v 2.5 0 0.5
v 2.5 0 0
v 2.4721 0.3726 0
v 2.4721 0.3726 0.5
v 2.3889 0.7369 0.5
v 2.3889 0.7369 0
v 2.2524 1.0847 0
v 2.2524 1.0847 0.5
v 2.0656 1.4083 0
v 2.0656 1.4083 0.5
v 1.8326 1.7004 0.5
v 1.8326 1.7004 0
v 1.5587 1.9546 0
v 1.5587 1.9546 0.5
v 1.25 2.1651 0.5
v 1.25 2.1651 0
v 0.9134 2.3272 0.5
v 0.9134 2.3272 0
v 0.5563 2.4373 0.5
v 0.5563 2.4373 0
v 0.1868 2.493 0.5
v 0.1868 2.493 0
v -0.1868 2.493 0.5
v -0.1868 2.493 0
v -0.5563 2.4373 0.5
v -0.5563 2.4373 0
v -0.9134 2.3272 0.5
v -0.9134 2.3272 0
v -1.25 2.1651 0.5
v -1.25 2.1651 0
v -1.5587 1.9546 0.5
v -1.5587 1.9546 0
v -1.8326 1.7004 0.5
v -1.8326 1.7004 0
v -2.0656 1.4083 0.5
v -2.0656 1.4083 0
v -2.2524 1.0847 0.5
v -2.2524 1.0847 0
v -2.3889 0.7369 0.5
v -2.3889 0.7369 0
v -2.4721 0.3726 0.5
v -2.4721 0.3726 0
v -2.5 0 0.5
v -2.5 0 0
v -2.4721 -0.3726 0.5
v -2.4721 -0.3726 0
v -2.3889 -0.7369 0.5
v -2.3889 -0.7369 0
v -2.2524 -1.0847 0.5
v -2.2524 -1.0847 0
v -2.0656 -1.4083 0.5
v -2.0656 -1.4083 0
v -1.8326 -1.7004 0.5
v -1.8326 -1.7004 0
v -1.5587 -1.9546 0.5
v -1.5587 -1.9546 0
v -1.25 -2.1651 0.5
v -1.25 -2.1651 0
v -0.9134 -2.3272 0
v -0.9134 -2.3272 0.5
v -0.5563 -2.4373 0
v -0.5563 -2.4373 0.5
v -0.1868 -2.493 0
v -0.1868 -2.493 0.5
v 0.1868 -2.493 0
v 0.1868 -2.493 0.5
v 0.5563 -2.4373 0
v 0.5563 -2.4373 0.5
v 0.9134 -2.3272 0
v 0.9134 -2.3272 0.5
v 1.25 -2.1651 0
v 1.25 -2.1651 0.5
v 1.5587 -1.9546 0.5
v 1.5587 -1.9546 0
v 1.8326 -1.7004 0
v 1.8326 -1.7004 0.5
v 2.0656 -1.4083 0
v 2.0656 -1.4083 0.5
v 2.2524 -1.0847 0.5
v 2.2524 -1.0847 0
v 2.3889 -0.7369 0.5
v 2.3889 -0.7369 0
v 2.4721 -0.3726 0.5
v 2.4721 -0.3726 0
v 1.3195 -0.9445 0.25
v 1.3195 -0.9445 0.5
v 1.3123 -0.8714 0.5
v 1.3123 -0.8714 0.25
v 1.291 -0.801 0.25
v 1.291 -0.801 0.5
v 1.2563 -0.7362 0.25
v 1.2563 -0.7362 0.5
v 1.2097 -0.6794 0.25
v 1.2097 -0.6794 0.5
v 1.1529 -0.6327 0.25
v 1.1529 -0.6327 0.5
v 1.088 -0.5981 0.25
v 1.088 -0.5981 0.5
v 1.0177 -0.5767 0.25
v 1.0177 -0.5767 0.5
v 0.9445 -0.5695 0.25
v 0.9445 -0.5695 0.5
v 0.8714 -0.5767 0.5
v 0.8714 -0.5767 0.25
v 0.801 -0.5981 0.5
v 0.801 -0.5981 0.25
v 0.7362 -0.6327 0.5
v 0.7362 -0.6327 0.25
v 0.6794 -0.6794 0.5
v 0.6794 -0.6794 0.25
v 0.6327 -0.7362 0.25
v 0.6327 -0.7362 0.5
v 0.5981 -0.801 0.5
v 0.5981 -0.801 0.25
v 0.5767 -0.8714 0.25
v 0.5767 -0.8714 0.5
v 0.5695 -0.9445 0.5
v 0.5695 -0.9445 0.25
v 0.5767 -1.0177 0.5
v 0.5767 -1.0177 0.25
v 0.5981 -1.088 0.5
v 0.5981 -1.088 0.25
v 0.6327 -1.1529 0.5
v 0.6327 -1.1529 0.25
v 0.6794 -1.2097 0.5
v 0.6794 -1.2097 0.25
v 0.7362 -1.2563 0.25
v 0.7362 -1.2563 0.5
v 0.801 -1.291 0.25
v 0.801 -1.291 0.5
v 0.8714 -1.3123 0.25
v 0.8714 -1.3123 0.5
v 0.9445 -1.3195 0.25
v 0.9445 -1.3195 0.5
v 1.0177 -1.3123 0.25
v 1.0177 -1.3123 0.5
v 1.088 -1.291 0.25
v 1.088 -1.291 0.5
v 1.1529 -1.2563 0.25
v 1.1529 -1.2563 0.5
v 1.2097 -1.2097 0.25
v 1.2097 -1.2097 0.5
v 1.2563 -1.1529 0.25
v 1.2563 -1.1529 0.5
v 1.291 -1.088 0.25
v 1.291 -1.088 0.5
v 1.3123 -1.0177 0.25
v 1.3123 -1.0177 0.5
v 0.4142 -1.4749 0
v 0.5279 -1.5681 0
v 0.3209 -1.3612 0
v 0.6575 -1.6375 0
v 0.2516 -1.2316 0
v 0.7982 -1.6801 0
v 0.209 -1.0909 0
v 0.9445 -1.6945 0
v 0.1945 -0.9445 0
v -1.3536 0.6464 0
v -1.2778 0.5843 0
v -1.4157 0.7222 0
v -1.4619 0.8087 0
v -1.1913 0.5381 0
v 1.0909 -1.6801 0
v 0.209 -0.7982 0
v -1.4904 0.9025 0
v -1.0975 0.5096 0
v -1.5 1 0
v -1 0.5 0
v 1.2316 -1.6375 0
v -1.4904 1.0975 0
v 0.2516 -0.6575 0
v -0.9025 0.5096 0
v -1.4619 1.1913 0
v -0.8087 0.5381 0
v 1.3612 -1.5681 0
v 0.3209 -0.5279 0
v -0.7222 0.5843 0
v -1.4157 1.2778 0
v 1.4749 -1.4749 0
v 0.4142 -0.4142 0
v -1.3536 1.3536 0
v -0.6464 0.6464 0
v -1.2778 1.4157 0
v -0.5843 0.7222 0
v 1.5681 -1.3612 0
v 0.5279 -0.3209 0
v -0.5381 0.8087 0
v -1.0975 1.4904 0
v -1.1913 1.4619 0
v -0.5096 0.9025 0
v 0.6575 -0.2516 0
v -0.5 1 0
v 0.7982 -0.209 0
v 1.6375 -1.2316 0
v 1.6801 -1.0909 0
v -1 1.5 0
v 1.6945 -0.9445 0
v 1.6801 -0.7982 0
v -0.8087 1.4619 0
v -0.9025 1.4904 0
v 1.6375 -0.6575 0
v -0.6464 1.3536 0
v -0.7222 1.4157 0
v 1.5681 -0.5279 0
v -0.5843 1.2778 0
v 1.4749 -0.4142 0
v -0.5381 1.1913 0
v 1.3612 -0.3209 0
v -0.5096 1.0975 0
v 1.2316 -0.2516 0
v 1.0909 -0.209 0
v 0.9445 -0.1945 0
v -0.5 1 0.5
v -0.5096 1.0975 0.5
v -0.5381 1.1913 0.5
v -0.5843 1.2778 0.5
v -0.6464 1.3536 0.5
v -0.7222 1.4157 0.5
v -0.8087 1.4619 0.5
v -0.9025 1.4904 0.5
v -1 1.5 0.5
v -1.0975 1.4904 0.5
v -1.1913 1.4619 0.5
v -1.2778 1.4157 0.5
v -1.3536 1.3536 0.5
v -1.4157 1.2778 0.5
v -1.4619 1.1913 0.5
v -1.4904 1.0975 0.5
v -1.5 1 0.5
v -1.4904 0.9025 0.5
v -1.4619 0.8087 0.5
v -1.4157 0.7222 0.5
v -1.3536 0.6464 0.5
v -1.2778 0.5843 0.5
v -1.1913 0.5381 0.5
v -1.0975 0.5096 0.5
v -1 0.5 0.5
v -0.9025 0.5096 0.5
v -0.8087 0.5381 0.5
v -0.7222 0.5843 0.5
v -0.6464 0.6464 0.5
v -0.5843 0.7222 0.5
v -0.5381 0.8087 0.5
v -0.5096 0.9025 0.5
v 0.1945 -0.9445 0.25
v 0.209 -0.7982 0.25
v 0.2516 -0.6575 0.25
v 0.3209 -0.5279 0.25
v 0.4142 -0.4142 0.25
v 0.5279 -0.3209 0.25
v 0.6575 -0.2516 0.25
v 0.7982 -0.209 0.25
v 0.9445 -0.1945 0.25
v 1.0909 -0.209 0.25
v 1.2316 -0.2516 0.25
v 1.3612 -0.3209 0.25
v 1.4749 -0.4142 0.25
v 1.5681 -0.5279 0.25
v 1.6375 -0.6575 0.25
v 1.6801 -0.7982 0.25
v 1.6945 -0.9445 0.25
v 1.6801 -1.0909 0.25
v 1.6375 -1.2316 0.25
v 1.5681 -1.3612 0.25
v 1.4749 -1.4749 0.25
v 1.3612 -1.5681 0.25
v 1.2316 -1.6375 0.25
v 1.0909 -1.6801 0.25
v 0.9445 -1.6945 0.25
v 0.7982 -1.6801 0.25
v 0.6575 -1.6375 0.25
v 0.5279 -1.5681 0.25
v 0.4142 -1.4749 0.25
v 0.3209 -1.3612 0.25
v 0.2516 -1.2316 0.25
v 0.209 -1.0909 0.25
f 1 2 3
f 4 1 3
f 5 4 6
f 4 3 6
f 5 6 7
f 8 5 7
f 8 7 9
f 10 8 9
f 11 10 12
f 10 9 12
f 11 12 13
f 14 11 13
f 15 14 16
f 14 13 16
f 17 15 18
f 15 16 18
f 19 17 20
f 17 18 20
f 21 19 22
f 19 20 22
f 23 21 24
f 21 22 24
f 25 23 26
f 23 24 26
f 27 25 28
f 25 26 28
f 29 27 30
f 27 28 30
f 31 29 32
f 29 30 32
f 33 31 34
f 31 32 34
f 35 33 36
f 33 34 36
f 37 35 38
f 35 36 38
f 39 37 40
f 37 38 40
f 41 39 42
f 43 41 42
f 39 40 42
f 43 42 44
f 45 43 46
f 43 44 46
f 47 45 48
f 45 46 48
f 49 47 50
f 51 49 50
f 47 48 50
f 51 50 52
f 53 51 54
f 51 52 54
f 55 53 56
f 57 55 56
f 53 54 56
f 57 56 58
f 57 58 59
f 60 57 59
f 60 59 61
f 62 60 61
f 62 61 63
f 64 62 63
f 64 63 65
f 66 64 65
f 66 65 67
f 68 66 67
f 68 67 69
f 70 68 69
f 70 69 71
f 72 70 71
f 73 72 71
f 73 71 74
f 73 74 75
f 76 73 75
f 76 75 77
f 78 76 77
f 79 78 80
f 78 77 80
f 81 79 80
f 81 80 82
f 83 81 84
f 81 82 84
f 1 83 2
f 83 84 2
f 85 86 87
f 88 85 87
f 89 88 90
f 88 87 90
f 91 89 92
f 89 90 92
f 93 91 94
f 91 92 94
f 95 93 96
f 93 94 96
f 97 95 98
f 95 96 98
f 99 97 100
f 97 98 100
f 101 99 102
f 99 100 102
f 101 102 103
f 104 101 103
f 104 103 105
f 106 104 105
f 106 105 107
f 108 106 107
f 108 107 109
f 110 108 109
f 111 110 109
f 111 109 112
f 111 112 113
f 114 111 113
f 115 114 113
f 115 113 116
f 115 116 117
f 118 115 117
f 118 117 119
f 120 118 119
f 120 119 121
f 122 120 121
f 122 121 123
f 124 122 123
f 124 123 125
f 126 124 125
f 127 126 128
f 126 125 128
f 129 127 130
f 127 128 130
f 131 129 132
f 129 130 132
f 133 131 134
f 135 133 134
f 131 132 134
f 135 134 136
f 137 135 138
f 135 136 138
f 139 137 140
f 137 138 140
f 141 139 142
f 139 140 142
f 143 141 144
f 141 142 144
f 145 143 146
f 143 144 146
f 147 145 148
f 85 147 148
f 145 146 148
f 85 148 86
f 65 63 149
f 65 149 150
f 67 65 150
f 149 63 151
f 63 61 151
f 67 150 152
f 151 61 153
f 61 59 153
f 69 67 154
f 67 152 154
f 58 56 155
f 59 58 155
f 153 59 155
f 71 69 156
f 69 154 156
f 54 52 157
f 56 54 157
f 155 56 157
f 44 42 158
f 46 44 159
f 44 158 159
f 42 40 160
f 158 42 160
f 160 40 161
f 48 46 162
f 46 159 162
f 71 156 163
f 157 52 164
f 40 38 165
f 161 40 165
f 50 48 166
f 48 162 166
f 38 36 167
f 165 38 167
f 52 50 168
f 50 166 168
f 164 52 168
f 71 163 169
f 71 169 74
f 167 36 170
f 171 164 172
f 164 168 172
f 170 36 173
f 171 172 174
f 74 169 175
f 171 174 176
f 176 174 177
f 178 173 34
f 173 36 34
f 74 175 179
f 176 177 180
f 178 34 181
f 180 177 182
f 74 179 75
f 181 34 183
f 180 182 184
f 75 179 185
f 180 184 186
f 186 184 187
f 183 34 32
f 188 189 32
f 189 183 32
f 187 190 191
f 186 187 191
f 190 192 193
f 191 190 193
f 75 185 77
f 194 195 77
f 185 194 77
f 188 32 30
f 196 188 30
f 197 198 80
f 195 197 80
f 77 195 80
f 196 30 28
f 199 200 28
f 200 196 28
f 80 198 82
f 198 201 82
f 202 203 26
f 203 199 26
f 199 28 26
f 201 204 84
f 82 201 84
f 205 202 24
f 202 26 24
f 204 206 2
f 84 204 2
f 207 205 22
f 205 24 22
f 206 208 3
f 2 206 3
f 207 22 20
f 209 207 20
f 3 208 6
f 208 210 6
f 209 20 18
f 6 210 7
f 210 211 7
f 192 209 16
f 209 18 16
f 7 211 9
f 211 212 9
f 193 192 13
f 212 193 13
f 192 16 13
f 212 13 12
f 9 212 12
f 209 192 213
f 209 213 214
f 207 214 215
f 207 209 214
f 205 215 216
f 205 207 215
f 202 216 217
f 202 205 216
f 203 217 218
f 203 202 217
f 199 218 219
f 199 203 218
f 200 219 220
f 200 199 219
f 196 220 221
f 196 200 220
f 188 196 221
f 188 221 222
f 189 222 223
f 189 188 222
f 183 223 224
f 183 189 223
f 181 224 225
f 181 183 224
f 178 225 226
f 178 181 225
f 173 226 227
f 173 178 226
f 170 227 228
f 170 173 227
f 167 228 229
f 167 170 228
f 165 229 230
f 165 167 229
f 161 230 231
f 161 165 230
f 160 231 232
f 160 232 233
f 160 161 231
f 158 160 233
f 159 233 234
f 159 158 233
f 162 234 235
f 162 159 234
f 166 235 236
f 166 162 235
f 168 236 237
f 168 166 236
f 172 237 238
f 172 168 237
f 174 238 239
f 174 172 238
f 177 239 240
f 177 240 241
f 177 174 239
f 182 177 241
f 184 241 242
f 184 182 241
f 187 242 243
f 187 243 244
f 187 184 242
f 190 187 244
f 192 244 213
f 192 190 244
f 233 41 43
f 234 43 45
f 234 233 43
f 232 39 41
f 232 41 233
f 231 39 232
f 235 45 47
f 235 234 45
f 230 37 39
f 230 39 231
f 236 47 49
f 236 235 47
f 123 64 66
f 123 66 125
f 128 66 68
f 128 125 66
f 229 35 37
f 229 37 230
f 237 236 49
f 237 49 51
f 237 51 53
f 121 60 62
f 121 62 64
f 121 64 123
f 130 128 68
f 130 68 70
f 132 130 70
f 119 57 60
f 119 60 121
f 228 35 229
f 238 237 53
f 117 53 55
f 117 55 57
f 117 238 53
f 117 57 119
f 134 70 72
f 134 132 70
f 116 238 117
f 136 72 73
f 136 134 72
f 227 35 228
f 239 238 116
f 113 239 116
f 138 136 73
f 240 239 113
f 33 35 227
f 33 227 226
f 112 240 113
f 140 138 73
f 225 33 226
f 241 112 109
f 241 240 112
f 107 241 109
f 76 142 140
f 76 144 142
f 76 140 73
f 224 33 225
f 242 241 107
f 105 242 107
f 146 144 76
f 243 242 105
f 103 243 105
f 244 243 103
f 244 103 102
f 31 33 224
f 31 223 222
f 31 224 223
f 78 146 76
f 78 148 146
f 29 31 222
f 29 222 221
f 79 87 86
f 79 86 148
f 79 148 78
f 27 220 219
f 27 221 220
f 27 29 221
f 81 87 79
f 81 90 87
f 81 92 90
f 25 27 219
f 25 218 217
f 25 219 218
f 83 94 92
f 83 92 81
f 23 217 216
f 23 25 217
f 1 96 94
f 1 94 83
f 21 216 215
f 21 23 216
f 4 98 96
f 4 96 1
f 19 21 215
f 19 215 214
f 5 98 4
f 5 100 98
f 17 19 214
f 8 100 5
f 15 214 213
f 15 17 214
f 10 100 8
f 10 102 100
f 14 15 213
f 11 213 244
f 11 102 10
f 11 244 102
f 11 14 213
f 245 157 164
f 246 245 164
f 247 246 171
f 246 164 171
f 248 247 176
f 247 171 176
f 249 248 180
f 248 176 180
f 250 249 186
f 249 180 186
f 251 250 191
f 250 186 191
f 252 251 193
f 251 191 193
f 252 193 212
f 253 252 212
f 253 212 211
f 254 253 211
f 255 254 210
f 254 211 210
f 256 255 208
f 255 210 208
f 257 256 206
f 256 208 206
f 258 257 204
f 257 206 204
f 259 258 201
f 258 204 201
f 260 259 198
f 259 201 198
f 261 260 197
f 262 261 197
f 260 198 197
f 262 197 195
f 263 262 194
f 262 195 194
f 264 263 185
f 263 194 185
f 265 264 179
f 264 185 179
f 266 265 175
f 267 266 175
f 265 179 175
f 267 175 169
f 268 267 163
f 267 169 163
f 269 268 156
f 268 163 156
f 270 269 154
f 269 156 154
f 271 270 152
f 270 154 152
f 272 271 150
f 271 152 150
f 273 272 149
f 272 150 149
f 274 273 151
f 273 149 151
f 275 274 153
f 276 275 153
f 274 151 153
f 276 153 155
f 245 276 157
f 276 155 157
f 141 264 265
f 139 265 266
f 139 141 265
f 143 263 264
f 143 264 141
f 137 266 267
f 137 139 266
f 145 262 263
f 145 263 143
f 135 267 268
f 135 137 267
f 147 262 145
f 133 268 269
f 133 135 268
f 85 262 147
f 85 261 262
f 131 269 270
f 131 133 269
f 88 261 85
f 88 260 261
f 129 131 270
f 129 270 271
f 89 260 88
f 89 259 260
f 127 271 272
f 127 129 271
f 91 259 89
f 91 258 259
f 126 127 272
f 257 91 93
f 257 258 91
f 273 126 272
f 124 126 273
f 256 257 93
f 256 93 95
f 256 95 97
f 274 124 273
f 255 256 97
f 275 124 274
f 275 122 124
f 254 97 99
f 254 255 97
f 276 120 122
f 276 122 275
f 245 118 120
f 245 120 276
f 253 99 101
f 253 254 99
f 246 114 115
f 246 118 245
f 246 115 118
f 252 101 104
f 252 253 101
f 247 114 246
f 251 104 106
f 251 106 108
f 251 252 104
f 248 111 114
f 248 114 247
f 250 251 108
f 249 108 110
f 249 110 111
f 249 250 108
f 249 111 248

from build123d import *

# Parameters (mm, degrees)
CROQUIS1_R                 = 2.5
CROQUIS1_R_2               = 0.5
SALIENTE_EXTRUIR1_DEPTH    = 0.5
CROQUIS2_R                 = 0.75
CORTAR_EXTRUIR1_DEPTH      = 0.25
TALADRO_ROSCADO_M1X0_251_D = 0.75


with BuildPart() as part:
    # Croquis1 → Saliente-Extruir1 (new body)
    with BuildSketch(Plane.XY):
        Circle(CROQUIS1_R)
        with Locations((-1, 1)):
            Circle(CROQUIS1_R_2, mode=Mode.SUBTRACT)
    extrude(amount=SALIENTE_EXTRUIR1_DEPTH)

    # Croquis2 → Cortar-Extruir1 (cut)
    with BuildSketch(Plane(origin=(0, 0, 0), x_dir=(-1, 0, 0), z_dir=(0, 0, -1))):
        with Locations((-0.944543648, -0.944543648)):
            Circle(CROQUIS2_R)
    extrude(amount=-CORTAR_EXTRUIR1_DEPTH, mode=Mode.SUBTRACT)

    # Taladro roscado M1x0.251 (through all)
    with Locations(Plane(origin=(0, 0, 0.25), x_dir=(-1, 0, 0), z_dir=(0, 0, -1))):
        with Locations((-0.944543648, -0.944543648)):
            Hole(TALADRO_ROSCADO_M1X0_251_D / 2)


solid = part.part
